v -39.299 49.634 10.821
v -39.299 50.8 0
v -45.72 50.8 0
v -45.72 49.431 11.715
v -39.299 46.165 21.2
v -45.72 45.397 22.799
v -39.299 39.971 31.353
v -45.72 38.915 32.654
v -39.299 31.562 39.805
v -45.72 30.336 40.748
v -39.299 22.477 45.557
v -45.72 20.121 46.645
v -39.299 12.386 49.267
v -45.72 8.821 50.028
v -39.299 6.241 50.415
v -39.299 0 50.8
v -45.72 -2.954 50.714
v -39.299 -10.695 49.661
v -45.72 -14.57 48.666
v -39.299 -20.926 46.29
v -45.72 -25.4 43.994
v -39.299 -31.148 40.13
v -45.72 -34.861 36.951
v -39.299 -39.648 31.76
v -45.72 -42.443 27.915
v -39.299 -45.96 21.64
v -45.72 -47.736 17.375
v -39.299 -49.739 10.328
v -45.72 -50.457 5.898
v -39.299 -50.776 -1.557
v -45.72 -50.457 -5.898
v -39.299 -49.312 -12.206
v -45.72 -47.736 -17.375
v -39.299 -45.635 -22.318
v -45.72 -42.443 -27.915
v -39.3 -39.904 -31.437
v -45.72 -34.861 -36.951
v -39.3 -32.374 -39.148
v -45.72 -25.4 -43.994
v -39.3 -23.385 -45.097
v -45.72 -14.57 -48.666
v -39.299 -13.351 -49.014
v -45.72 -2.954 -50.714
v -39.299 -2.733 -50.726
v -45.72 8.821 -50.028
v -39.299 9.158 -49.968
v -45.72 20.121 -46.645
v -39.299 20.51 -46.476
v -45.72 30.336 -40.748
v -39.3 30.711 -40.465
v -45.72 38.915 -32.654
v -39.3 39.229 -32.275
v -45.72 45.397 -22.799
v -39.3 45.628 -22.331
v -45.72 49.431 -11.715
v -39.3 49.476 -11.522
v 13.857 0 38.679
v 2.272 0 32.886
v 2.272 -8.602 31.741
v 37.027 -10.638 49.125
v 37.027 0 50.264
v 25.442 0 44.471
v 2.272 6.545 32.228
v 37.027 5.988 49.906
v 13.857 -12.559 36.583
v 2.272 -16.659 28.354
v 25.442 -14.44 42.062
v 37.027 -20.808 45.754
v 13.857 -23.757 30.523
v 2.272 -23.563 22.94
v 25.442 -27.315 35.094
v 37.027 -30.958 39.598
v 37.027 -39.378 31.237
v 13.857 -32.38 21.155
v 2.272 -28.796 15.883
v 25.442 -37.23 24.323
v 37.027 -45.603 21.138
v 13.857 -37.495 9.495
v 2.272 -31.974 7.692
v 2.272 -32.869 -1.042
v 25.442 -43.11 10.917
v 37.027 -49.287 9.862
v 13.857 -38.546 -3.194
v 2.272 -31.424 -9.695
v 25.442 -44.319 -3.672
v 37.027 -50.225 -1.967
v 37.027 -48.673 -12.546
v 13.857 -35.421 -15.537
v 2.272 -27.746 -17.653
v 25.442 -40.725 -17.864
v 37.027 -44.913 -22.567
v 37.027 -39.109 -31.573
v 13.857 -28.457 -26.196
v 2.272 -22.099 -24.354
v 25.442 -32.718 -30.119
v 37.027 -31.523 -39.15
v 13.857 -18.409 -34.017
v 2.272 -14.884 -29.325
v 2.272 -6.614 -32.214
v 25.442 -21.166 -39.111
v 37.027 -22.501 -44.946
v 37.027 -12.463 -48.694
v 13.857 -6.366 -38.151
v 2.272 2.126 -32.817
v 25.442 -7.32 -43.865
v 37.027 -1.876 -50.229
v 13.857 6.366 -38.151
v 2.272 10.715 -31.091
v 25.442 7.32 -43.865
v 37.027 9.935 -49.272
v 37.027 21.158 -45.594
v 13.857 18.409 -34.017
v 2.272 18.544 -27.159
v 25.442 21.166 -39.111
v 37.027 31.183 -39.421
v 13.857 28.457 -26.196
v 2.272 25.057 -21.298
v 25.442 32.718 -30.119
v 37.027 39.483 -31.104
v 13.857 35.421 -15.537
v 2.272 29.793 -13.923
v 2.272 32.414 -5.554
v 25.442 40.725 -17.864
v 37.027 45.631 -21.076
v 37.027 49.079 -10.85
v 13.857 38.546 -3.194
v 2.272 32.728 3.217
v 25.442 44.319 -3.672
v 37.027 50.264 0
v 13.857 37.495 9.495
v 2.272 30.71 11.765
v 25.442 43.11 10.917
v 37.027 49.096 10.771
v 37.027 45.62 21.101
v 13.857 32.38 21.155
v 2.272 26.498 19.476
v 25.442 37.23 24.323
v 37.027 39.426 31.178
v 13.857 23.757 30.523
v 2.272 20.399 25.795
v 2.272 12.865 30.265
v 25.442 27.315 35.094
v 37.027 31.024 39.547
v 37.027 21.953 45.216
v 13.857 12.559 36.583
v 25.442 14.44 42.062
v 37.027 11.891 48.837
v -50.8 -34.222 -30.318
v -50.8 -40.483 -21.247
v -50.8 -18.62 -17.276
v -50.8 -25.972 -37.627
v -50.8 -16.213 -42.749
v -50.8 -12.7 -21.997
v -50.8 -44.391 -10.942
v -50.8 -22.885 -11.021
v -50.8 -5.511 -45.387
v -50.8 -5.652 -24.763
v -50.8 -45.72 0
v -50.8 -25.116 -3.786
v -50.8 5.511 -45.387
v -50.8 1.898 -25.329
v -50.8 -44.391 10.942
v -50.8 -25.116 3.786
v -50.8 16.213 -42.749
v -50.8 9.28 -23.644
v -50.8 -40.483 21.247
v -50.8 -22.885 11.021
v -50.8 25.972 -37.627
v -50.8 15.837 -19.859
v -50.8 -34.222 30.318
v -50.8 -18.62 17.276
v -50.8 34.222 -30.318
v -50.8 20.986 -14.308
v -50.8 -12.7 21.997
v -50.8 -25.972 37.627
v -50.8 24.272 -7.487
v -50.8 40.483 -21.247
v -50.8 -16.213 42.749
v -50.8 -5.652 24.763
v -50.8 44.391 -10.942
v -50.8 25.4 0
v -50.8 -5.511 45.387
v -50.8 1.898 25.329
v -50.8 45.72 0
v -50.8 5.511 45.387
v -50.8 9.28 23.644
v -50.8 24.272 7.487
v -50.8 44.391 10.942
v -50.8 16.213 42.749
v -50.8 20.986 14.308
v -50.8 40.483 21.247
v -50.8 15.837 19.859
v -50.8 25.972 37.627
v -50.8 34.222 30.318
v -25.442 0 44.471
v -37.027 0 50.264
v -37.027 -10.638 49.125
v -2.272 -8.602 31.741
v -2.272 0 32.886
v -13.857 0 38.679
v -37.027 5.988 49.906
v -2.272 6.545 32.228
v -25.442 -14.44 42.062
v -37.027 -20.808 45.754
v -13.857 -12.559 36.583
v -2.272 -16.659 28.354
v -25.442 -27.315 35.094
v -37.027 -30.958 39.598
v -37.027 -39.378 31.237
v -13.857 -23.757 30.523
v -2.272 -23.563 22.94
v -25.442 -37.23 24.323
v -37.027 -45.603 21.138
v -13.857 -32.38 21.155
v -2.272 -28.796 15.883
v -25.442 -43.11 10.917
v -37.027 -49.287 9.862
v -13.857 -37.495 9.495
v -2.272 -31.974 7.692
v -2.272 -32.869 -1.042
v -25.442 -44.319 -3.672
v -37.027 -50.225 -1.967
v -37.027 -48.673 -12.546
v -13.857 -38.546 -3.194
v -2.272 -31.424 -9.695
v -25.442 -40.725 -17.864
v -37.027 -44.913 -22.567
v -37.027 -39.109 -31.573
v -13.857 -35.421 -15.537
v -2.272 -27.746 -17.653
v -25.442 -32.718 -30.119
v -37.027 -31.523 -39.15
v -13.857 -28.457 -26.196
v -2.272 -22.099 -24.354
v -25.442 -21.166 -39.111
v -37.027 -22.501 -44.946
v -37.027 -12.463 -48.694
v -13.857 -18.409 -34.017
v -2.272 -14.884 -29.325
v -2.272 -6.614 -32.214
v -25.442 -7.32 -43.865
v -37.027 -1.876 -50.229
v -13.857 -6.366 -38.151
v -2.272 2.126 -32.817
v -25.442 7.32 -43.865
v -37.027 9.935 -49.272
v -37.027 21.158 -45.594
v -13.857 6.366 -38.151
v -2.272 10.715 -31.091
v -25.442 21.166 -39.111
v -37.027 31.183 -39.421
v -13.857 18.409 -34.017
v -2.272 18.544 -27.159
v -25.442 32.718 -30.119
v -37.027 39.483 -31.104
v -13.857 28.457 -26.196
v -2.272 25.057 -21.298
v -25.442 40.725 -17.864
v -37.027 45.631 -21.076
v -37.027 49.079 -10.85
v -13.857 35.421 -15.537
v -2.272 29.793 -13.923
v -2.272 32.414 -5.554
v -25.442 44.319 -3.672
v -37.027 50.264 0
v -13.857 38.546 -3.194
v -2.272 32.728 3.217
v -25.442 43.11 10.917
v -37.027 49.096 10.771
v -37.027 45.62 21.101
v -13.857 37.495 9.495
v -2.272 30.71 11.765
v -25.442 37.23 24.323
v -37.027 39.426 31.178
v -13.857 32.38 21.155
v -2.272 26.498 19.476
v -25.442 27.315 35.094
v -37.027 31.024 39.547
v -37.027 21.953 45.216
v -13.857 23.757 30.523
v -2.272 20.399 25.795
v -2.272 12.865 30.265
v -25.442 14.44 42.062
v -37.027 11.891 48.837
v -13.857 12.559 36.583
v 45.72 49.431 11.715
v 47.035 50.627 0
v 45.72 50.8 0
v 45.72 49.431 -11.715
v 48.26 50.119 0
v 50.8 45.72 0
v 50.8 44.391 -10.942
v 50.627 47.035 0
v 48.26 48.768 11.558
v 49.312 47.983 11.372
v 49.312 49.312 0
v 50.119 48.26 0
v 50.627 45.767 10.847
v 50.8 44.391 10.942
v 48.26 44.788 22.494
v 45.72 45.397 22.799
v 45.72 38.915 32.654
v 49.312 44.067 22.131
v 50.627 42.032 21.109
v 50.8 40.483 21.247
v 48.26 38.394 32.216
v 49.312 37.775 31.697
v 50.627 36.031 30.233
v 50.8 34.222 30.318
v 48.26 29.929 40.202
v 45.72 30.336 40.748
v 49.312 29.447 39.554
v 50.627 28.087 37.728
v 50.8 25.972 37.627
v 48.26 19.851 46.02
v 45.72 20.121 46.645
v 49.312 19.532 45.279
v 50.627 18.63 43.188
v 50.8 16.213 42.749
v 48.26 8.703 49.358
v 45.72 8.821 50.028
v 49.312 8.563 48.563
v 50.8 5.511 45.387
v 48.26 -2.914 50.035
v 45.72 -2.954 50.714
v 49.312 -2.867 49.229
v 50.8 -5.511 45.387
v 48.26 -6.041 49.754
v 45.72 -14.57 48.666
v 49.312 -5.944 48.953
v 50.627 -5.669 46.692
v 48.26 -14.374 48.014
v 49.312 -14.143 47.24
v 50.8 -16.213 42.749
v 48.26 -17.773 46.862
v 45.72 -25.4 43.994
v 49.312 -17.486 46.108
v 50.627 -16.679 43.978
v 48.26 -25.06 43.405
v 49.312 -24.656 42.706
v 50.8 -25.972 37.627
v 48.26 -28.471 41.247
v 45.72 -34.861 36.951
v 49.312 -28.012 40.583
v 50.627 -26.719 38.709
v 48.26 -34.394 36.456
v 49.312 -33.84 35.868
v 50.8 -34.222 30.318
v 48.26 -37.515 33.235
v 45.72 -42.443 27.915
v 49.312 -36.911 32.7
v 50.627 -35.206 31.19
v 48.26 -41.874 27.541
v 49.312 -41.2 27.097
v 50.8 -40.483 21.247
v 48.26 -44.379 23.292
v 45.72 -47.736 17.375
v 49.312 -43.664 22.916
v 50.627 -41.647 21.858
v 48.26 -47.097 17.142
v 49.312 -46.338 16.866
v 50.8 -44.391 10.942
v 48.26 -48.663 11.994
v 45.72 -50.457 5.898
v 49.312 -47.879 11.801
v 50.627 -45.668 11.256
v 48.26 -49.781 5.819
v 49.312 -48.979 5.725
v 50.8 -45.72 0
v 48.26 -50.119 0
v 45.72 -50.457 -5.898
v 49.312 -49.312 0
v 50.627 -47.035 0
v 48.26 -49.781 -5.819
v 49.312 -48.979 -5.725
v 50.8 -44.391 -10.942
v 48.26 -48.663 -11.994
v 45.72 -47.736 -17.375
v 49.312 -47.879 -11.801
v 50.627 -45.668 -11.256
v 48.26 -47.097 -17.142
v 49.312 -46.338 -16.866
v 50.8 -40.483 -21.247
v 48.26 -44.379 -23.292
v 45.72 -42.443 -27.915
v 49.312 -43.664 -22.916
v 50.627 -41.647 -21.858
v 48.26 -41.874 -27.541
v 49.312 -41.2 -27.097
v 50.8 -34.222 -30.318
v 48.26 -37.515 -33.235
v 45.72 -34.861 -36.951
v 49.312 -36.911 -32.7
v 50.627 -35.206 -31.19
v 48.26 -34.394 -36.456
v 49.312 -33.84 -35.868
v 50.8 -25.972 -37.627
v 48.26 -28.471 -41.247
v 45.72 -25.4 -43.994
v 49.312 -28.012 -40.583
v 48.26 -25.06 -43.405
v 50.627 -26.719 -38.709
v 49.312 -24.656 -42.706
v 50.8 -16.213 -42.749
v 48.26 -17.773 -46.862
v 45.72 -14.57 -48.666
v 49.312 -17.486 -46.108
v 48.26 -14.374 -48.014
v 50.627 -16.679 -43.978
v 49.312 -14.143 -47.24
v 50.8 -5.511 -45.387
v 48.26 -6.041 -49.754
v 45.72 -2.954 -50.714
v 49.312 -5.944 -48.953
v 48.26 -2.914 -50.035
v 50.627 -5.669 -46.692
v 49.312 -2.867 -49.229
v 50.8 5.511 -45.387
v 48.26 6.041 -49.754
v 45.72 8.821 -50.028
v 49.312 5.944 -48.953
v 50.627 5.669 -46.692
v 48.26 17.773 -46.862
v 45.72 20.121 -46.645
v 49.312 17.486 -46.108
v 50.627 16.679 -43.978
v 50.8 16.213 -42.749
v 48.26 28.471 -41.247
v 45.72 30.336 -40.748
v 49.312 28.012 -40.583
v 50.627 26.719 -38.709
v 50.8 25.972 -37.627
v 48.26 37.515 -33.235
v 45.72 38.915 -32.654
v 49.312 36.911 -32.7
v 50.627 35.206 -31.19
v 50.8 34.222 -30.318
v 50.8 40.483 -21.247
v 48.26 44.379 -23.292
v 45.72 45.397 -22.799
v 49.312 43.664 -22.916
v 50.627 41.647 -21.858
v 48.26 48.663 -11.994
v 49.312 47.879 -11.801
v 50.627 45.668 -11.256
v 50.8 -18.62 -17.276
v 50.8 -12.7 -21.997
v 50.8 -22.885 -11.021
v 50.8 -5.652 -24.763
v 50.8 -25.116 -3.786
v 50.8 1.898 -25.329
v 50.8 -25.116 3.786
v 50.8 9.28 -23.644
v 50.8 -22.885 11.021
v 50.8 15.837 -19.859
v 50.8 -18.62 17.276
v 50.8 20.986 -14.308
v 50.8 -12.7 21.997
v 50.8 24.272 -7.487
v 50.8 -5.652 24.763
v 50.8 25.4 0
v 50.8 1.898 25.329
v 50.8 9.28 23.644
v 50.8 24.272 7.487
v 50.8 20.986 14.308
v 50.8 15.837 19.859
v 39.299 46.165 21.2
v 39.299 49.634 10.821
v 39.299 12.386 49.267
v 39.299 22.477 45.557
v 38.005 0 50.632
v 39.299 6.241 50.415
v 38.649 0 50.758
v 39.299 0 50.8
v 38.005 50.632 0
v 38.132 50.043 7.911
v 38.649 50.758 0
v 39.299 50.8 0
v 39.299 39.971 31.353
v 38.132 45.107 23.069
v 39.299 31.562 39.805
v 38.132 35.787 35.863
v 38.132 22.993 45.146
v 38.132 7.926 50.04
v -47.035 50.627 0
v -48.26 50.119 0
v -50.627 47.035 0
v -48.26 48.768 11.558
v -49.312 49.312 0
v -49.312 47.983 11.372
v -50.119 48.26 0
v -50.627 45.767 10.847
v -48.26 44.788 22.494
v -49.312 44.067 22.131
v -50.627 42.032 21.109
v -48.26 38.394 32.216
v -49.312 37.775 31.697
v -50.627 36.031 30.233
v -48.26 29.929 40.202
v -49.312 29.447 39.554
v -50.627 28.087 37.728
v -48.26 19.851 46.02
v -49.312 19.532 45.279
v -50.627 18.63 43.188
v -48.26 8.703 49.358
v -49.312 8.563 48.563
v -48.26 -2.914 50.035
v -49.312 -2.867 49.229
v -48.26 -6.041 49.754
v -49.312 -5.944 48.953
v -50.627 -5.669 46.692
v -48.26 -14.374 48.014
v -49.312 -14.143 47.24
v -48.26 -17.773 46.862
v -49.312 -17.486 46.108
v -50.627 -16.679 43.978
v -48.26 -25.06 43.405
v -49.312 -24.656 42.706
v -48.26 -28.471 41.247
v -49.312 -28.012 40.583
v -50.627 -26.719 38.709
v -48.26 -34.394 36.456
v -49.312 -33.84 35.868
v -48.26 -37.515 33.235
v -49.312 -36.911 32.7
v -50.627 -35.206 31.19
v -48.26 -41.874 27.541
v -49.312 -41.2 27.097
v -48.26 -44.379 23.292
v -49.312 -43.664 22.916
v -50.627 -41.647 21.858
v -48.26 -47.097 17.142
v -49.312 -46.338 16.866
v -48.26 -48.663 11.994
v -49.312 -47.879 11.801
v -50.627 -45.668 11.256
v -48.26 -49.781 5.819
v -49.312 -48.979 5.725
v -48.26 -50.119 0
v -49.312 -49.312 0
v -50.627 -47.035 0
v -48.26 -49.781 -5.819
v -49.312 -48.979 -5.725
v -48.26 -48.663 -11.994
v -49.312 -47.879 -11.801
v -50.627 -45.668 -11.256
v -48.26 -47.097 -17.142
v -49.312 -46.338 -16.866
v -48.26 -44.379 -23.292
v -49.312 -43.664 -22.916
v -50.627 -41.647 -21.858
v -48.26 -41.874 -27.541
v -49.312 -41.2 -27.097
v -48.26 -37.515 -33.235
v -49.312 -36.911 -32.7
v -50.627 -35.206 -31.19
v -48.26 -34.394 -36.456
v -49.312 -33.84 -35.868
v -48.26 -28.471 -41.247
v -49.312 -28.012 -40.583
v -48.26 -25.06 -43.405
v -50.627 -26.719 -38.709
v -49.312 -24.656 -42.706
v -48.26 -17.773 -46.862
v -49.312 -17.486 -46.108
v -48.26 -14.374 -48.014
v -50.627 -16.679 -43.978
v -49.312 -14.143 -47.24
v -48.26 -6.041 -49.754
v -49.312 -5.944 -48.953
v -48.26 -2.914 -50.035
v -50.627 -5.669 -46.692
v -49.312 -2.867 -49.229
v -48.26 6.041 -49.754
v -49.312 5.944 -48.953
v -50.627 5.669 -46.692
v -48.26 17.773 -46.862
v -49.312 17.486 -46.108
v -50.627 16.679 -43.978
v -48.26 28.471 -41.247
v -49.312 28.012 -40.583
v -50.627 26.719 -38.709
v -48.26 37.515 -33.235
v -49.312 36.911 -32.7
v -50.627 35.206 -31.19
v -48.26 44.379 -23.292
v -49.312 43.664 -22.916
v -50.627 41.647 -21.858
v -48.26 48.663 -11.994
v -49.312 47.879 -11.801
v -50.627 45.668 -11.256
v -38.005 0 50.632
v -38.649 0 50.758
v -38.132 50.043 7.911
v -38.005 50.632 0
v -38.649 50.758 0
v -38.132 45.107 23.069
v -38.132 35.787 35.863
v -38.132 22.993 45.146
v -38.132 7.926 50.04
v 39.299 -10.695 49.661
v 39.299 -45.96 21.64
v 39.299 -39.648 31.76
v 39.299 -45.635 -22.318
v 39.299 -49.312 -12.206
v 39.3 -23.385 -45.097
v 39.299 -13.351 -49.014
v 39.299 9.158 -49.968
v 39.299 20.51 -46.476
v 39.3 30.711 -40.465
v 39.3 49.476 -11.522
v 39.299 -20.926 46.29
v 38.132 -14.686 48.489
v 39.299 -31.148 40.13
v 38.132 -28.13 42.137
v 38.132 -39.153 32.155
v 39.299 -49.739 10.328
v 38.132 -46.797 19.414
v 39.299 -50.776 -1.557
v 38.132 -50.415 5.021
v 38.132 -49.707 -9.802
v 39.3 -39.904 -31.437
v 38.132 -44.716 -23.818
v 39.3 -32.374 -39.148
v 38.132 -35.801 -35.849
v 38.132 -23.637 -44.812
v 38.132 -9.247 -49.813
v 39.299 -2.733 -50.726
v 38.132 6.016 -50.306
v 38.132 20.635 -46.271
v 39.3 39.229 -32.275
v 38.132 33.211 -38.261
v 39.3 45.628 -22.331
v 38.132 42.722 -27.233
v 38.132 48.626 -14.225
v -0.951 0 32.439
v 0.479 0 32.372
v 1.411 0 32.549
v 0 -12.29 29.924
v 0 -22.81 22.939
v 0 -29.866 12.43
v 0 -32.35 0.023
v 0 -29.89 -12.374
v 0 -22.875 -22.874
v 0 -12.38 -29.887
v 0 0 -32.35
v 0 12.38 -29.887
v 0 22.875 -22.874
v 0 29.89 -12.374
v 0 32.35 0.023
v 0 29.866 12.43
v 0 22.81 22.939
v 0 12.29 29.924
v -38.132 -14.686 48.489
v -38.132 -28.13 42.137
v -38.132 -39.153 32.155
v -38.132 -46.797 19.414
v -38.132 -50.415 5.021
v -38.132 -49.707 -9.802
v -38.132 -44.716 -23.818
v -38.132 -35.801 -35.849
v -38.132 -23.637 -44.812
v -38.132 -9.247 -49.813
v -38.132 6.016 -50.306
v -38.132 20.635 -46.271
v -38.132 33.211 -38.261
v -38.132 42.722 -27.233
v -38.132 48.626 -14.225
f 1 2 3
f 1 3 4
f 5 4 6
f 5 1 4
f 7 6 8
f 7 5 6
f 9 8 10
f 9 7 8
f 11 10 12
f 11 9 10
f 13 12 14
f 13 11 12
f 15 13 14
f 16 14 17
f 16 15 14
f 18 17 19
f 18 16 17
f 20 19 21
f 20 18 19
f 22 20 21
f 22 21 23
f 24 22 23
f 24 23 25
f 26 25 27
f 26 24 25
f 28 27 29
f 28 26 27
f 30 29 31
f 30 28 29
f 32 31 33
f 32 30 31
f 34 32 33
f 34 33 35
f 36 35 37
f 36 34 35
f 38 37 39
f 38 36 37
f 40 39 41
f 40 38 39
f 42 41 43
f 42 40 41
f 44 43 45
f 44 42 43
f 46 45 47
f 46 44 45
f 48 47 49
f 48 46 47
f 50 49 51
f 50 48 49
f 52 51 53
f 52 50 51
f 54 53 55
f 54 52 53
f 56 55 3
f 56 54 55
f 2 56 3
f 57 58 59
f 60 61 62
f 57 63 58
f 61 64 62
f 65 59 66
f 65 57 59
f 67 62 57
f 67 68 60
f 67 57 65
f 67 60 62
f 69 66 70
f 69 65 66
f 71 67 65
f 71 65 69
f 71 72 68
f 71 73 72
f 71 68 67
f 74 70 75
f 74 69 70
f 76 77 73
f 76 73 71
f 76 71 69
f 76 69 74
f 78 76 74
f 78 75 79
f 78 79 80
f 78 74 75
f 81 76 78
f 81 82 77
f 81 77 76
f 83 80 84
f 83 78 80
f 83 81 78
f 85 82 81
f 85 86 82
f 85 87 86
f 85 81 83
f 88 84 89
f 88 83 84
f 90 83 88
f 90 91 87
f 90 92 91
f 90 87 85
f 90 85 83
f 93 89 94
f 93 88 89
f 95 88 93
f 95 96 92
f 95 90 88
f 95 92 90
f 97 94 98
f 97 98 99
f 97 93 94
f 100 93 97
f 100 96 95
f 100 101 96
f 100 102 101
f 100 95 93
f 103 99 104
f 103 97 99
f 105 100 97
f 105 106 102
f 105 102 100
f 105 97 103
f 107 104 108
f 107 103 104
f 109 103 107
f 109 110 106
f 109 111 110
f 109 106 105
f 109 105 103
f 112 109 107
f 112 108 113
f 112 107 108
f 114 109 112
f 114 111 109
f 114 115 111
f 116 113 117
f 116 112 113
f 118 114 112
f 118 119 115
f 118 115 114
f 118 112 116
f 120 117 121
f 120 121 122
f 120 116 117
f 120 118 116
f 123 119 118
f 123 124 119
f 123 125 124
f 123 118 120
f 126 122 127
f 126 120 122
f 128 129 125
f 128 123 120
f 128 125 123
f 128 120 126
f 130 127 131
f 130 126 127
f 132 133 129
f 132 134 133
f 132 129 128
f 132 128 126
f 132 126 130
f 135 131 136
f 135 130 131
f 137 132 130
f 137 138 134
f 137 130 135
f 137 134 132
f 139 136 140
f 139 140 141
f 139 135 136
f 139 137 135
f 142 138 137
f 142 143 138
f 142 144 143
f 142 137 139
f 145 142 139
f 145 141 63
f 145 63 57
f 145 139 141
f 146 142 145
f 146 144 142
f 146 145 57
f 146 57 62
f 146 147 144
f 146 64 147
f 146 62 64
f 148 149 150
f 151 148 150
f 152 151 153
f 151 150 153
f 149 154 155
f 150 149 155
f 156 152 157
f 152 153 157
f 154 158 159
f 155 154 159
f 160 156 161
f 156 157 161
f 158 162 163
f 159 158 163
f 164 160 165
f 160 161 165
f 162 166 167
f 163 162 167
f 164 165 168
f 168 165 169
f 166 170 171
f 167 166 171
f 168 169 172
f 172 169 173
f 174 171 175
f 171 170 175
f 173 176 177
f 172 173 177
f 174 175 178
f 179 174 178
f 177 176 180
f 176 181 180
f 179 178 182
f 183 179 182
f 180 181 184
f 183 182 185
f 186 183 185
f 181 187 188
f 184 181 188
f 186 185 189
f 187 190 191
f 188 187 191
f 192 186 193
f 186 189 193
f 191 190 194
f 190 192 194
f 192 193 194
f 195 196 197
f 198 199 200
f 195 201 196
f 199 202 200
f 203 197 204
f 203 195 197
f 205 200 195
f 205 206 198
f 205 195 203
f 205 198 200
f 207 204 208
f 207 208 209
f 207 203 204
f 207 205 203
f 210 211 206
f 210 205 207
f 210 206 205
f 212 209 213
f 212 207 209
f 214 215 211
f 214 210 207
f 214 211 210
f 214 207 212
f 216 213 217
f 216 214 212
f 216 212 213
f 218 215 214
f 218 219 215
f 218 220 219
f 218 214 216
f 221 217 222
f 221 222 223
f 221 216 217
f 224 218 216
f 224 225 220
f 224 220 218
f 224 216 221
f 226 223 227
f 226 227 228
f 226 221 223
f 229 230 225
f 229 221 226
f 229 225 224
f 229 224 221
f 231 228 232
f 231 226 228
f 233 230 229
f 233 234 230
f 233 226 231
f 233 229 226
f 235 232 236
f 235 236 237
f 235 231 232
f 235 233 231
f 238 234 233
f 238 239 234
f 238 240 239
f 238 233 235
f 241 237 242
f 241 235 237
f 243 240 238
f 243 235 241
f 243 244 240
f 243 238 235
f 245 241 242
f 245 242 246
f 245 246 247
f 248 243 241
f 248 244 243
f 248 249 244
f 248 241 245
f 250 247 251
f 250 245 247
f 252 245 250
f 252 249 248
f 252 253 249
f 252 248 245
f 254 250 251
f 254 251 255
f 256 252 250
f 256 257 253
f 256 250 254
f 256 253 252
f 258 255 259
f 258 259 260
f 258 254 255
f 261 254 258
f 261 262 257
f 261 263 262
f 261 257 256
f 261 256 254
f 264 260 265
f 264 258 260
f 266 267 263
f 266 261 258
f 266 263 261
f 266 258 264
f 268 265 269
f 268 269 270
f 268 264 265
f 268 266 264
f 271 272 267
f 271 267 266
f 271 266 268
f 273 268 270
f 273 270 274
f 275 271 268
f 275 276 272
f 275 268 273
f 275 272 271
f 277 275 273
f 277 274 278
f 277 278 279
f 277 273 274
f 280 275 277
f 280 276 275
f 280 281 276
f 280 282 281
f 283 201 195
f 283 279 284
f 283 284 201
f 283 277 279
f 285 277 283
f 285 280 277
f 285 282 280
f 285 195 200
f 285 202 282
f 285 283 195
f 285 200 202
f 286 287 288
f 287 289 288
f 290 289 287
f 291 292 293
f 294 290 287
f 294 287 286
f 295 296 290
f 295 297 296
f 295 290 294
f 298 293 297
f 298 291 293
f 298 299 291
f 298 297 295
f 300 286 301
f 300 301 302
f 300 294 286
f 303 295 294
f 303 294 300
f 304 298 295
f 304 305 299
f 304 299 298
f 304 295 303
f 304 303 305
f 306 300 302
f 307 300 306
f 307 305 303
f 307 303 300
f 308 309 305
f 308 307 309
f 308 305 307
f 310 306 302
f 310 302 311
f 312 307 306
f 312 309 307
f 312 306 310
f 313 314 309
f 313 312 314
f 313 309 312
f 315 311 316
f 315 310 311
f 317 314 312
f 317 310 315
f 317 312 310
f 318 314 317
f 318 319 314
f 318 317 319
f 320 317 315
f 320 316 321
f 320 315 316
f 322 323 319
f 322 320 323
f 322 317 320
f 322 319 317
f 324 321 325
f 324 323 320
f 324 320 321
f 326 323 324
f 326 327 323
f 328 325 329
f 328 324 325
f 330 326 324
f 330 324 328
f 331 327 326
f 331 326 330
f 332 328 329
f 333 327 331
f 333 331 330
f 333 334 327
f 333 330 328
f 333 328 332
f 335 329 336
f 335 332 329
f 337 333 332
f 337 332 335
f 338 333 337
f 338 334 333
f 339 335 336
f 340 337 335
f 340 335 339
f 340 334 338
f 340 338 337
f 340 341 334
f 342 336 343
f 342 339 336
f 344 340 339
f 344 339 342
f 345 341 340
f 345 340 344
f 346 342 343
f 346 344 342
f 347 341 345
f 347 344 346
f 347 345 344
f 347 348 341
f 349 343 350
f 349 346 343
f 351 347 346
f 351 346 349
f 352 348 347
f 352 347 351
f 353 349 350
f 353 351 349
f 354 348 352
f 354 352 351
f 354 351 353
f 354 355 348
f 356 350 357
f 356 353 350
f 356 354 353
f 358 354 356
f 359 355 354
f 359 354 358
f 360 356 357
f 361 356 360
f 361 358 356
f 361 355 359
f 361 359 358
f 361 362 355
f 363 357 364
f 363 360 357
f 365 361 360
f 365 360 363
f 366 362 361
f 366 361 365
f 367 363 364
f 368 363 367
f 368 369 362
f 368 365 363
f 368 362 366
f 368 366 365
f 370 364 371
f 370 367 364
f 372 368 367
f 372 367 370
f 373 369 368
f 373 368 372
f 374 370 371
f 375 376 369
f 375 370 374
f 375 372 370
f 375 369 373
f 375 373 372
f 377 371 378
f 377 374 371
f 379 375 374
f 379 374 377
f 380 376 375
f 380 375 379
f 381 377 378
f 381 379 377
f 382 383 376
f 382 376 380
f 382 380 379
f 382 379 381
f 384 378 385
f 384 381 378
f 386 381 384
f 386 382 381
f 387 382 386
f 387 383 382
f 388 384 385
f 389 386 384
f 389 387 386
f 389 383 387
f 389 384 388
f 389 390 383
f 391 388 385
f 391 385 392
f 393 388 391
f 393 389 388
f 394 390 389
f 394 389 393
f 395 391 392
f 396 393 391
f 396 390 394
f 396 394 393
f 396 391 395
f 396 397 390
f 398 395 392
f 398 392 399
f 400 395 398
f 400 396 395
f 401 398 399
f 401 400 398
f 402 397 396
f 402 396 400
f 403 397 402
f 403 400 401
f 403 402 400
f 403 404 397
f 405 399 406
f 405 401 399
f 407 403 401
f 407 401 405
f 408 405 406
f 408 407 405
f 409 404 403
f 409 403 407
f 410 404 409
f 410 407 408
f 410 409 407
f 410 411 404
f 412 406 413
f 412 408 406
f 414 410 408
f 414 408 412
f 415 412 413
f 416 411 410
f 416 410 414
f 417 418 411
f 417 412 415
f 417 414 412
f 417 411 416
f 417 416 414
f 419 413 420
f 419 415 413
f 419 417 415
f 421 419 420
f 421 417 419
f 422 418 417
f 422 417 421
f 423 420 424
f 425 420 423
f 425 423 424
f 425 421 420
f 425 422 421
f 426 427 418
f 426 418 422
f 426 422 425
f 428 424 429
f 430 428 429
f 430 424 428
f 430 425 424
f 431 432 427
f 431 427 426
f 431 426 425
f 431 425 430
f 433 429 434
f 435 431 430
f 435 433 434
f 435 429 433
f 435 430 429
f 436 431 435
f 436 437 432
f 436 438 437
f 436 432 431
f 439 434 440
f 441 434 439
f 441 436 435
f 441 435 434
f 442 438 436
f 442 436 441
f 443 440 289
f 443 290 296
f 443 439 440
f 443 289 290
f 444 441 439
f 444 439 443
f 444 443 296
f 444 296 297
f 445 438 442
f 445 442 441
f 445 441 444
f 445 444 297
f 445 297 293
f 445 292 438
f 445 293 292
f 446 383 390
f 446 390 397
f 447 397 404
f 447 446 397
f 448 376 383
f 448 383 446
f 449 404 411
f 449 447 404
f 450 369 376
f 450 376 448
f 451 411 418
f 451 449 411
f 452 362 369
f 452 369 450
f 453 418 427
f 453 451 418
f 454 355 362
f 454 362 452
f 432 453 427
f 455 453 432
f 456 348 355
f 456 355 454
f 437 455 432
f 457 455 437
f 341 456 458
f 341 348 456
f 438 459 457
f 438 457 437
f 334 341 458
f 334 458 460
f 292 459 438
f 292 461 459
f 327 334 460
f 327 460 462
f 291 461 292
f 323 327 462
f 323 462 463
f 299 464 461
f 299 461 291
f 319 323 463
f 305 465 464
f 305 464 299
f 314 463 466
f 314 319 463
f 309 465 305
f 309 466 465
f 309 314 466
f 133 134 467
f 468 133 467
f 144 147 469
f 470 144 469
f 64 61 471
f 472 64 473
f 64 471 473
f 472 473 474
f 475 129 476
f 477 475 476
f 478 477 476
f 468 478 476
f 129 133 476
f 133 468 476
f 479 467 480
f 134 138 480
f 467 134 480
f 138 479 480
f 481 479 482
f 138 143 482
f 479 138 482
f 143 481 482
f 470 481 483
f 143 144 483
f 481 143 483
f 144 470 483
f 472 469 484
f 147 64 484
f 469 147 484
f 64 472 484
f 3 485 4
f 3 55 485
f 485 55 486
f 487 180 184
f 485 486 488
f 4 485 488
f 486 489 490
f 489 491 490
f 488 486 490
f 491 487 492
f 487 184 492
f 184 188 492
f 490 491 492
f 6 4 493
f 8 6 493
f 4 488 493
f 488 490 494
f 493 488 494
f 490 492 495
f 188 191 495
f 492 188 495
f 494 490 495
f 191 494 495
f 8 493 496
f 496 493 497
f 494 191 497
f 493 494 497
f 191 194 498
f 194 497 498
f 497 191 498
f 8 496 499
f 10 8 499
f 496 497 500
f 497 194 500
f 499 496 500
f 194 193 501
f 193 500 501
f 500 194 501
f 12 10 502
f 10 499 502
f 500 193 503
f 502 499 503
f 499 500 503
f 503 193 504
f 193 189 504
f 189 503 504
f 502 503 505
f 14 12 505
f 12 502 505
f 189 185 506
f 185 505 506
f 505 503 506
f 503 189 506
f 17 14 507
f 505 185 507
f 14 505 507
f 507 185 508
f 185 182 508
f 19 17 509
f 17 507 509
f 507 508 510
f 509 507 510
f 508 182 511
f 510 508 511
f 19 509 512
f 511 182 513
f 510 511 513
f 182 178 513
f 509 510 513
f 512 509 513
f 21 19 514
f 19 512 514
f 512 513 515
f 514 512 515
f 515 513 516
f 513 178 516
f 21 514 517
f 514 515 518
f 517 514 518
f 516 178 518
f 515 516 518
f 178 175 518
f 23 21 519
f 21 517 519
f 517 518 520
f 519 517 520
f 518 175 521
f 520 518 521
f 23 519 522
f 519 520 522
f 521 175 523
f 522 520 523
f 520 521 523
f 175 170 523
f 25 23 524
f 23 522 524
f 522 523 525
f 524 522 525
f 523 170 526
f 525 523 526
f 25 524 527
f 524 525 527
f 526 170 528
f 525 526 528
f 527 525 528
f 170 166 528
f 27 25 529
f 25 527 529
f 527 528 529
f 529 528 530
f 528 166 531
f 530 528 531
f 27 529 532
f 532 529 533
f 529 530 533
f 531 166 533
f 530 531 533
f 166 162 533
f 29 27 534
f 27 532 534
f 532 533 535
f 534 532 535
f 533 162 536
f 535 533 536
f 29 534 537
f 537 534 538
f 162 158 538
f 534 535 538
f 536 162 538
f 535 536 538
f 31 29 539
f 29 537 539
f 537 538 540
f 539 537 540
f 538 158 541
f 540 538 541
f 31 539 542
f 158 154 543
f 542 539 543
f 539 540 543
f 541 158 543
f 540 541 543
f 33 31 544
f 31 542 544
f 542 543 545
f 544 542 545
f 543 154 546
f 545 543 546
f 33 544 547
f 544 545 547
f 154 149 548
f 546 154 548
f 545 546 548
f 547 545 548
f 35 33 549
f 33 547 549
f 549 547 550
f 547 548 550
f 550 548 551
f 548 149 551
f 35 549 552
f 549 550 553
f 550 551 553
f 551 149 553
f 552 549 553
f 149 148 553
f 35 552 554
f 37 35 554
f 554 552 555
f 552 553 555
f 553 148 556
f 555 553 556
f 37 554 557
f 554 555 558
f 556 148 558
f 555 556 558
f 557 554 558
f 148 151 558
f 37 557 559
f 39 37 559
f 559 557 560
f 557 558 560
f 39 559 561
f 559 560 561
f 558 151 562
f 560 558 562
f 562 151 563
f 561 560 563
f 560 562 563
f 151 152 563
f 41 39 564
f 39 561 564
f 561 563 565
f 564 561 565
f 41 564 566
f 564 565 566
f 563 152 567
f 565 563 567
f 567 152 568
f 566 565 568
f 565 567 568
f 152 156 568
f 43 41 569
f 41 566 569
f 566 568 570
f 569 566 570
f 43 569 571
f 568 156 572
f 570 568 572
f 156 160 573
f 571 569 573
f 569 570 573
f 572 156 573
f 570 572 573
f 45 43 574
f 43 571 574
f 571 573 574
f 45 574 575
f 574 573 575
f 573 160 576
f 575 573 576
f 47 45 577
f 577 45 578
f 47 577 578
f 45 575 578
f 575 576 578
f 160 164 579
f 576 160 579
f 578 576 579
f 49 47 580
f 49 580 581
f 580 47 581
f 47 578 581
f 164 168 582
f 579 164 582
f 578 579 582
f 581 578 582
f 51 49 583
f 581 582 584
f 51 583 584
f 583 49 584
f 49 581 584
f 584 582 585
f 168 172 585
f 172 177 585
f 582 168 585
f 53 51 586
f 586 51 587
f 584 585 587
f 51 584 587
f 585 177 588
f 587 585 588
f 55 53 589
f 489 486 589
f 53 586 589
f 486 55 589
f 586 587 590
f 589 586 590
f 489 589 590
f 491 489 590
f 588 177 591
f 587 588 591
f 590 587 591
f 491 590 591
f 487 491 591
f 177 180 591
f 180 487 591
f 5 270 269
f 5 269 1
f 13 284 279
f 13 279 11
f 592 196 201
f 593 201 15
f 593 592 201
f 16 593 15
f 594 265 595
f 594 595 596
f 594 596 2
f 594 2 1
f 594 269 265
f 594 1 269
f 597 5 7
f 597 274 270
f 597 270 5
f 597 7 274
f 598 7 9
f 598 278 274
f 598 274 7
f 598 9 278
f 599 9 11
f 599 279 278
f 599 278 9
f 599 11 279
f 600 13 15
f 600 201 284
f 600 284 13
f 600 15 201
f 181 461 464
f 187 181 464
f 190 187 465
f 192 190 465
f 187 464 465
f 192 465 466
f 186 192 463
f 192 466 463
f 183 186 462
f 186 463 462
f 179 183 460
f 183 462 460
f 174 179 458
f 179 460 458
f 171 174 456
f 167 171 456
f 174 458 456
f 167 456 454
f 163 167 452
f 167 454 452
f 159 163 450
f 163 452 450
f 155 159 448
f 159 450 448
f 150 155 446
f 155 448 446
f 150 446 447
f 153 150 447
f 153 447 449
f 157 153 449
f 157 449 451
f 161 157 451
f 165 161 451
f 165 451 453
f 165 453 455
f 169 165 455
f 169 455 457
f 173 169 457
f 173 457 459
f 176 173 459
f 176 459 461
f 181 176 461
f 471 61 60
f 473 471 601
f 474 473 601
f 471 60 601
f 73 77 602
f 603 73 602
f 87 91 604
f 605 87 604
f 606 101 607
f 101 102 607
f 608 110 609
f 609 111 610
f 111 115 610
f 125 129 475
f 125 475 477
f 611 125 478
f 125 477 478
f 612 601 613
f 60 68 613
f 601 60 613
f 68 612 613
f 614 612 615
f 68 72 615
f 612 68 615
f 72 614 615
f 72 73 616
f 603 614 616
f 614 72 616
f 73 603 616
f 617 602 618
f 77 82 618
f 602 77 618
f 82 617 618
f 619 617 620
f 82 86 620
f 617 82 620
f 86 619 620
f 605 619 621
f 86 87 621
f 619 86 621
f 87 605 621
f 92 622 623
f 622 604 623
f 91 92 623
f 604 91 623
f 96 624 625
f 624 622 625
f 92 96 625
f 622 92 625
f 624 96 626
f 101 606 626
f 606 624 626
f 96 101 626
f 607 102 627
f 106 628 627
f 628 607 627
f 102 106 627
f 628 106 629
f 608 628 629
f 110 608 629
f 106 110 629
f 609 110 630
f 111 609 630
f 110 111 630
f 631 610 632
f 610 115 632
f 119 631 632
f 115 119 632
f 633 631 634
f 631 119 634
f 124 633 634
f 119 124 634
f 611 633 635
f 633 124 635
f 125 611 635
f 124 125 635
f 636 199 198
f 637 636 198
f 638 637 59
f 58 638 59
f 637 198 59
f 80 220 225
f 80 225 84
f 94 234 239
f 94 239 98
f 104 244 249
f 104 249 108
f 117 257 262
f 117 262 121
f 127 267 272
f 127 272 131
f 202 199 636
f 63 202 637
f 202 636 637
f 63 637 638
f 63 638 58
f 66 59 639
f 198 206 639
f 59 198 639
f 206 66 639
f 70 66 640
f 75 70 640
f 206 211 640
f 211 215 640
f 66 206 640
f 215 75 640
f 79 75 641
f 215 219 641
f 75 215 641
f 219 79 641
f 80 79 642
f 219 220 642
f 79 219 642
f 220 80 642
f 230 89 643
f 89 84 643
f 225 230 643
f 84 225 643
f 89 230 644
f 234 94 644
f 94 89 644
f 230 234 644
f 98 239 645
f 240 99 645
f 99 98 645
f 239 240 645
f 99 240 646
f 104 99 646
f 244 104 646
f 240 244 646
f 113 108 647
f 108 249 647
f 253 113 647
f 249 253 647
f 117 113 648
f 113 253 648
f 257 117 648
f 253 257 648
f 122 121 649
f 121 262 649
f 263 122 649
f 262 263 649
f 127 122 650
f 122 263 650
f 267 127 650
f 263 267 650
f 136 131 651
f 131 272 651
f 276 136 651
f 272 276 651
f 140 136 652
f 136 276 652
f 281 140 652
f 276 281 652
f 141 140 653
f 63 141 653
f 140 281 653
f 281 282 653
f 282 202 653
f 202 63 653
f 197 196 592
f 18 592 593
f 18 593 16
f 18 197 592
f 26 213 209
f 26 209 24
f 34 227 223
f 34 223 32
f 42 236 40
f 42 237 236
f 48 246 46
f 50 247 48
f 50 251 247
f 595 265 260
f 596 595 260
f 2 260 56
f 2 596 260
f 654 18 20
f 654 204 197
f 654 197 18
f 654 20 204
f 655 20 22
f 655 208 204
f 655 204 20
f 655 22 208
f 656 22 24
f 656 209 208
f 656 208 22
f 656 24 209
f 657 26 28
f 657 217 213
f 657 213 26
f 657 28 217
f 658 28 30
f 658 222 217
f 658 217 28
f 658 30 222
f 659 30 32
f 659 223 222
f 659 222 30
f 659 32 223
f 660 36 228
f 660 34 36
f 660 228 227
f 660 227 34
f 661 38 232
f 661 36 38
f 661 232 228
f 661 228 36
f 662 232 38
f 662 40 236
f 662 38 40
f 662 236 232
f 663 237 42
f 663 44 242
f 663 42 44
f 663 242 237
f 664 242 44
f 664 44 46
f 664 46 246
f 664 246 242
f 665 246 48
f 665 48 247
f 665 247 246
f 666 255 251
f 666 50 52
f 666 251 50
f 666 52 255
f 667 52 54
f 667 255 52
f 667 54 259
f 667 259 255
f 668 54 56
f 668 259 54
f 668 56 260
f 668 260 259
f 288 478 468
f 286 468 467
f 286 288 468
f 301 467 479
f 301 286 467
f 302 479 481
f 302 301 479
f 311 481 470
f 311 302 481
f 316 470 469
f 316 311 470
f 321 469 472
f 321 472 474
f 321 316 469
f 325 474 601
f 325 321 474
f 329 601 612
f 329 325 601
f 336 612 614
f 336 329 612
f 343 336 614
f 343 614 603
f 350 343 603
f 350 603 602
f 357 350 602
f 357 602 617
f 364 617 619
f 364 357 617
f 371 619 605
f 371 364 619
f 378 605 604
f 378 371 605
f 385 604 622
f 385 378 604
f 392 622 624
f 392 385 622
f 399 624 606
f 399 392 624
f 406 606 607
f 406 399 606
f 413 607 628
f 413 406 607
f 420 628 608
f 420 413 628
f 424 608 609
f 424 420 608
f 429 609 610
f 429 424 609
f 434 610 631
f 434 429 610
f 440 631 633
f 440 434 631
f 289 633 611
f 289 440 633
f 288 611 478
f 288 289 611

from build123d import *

# Parameters (mm, degrees)
F0_R     = 50.8
F1_DEPTH = 50.8
F2_R     = 25.4
F3_DEPTH = 101.601
F6_R     = 5.08
F7_R     = 5.08


with BuildPart() as f1:
    # F0 (on Right) → F1 (new body, symmetric)
    with BuildSketch(Plane.YZ):
        Circle(F0_R)
    extrude(amount=F1_DEPTH, both=True)

    # F2 (on face) → F3 (cut, through all)
    with BuildSketch(Plane.YZ.offset(50.8)):
        Circle(F2_R)
    extrude(amount=-F3_DEPTH, mode=Mode.SUBTRACT)

    # F4 (on Front) → F5 (revolve, cut)
    with BuildSketch(Plane.XZ):
        Polygon((38.1, 50.8), (-38.1, 50.8), (0, 31.75), align=None)
    revolve(axis=Axis((-4.27404, 0, 0), (1, 0, 0)), mode=Mode.SUBTRACT)

    # F6
    f6_edges = [f1.edges().sort_by_distance(p)[0] for p in [
        (0, 0, -31.75),
    ]]
    fillet(f6_edges, radius=F6_R)

    # F7
    f7_edges = [f1.edges().sort_by_distance(p)[0] for p in [
        (38.1, -35.921024, -35.921024),
        (50.8, -50.8, 0),
        (-38.1, -35.921024, -35.921024),
        (-50.8, -50.8, 0),
    ]]
    fillet(f7_edges, radius=F7_R)


solid = f1.part
